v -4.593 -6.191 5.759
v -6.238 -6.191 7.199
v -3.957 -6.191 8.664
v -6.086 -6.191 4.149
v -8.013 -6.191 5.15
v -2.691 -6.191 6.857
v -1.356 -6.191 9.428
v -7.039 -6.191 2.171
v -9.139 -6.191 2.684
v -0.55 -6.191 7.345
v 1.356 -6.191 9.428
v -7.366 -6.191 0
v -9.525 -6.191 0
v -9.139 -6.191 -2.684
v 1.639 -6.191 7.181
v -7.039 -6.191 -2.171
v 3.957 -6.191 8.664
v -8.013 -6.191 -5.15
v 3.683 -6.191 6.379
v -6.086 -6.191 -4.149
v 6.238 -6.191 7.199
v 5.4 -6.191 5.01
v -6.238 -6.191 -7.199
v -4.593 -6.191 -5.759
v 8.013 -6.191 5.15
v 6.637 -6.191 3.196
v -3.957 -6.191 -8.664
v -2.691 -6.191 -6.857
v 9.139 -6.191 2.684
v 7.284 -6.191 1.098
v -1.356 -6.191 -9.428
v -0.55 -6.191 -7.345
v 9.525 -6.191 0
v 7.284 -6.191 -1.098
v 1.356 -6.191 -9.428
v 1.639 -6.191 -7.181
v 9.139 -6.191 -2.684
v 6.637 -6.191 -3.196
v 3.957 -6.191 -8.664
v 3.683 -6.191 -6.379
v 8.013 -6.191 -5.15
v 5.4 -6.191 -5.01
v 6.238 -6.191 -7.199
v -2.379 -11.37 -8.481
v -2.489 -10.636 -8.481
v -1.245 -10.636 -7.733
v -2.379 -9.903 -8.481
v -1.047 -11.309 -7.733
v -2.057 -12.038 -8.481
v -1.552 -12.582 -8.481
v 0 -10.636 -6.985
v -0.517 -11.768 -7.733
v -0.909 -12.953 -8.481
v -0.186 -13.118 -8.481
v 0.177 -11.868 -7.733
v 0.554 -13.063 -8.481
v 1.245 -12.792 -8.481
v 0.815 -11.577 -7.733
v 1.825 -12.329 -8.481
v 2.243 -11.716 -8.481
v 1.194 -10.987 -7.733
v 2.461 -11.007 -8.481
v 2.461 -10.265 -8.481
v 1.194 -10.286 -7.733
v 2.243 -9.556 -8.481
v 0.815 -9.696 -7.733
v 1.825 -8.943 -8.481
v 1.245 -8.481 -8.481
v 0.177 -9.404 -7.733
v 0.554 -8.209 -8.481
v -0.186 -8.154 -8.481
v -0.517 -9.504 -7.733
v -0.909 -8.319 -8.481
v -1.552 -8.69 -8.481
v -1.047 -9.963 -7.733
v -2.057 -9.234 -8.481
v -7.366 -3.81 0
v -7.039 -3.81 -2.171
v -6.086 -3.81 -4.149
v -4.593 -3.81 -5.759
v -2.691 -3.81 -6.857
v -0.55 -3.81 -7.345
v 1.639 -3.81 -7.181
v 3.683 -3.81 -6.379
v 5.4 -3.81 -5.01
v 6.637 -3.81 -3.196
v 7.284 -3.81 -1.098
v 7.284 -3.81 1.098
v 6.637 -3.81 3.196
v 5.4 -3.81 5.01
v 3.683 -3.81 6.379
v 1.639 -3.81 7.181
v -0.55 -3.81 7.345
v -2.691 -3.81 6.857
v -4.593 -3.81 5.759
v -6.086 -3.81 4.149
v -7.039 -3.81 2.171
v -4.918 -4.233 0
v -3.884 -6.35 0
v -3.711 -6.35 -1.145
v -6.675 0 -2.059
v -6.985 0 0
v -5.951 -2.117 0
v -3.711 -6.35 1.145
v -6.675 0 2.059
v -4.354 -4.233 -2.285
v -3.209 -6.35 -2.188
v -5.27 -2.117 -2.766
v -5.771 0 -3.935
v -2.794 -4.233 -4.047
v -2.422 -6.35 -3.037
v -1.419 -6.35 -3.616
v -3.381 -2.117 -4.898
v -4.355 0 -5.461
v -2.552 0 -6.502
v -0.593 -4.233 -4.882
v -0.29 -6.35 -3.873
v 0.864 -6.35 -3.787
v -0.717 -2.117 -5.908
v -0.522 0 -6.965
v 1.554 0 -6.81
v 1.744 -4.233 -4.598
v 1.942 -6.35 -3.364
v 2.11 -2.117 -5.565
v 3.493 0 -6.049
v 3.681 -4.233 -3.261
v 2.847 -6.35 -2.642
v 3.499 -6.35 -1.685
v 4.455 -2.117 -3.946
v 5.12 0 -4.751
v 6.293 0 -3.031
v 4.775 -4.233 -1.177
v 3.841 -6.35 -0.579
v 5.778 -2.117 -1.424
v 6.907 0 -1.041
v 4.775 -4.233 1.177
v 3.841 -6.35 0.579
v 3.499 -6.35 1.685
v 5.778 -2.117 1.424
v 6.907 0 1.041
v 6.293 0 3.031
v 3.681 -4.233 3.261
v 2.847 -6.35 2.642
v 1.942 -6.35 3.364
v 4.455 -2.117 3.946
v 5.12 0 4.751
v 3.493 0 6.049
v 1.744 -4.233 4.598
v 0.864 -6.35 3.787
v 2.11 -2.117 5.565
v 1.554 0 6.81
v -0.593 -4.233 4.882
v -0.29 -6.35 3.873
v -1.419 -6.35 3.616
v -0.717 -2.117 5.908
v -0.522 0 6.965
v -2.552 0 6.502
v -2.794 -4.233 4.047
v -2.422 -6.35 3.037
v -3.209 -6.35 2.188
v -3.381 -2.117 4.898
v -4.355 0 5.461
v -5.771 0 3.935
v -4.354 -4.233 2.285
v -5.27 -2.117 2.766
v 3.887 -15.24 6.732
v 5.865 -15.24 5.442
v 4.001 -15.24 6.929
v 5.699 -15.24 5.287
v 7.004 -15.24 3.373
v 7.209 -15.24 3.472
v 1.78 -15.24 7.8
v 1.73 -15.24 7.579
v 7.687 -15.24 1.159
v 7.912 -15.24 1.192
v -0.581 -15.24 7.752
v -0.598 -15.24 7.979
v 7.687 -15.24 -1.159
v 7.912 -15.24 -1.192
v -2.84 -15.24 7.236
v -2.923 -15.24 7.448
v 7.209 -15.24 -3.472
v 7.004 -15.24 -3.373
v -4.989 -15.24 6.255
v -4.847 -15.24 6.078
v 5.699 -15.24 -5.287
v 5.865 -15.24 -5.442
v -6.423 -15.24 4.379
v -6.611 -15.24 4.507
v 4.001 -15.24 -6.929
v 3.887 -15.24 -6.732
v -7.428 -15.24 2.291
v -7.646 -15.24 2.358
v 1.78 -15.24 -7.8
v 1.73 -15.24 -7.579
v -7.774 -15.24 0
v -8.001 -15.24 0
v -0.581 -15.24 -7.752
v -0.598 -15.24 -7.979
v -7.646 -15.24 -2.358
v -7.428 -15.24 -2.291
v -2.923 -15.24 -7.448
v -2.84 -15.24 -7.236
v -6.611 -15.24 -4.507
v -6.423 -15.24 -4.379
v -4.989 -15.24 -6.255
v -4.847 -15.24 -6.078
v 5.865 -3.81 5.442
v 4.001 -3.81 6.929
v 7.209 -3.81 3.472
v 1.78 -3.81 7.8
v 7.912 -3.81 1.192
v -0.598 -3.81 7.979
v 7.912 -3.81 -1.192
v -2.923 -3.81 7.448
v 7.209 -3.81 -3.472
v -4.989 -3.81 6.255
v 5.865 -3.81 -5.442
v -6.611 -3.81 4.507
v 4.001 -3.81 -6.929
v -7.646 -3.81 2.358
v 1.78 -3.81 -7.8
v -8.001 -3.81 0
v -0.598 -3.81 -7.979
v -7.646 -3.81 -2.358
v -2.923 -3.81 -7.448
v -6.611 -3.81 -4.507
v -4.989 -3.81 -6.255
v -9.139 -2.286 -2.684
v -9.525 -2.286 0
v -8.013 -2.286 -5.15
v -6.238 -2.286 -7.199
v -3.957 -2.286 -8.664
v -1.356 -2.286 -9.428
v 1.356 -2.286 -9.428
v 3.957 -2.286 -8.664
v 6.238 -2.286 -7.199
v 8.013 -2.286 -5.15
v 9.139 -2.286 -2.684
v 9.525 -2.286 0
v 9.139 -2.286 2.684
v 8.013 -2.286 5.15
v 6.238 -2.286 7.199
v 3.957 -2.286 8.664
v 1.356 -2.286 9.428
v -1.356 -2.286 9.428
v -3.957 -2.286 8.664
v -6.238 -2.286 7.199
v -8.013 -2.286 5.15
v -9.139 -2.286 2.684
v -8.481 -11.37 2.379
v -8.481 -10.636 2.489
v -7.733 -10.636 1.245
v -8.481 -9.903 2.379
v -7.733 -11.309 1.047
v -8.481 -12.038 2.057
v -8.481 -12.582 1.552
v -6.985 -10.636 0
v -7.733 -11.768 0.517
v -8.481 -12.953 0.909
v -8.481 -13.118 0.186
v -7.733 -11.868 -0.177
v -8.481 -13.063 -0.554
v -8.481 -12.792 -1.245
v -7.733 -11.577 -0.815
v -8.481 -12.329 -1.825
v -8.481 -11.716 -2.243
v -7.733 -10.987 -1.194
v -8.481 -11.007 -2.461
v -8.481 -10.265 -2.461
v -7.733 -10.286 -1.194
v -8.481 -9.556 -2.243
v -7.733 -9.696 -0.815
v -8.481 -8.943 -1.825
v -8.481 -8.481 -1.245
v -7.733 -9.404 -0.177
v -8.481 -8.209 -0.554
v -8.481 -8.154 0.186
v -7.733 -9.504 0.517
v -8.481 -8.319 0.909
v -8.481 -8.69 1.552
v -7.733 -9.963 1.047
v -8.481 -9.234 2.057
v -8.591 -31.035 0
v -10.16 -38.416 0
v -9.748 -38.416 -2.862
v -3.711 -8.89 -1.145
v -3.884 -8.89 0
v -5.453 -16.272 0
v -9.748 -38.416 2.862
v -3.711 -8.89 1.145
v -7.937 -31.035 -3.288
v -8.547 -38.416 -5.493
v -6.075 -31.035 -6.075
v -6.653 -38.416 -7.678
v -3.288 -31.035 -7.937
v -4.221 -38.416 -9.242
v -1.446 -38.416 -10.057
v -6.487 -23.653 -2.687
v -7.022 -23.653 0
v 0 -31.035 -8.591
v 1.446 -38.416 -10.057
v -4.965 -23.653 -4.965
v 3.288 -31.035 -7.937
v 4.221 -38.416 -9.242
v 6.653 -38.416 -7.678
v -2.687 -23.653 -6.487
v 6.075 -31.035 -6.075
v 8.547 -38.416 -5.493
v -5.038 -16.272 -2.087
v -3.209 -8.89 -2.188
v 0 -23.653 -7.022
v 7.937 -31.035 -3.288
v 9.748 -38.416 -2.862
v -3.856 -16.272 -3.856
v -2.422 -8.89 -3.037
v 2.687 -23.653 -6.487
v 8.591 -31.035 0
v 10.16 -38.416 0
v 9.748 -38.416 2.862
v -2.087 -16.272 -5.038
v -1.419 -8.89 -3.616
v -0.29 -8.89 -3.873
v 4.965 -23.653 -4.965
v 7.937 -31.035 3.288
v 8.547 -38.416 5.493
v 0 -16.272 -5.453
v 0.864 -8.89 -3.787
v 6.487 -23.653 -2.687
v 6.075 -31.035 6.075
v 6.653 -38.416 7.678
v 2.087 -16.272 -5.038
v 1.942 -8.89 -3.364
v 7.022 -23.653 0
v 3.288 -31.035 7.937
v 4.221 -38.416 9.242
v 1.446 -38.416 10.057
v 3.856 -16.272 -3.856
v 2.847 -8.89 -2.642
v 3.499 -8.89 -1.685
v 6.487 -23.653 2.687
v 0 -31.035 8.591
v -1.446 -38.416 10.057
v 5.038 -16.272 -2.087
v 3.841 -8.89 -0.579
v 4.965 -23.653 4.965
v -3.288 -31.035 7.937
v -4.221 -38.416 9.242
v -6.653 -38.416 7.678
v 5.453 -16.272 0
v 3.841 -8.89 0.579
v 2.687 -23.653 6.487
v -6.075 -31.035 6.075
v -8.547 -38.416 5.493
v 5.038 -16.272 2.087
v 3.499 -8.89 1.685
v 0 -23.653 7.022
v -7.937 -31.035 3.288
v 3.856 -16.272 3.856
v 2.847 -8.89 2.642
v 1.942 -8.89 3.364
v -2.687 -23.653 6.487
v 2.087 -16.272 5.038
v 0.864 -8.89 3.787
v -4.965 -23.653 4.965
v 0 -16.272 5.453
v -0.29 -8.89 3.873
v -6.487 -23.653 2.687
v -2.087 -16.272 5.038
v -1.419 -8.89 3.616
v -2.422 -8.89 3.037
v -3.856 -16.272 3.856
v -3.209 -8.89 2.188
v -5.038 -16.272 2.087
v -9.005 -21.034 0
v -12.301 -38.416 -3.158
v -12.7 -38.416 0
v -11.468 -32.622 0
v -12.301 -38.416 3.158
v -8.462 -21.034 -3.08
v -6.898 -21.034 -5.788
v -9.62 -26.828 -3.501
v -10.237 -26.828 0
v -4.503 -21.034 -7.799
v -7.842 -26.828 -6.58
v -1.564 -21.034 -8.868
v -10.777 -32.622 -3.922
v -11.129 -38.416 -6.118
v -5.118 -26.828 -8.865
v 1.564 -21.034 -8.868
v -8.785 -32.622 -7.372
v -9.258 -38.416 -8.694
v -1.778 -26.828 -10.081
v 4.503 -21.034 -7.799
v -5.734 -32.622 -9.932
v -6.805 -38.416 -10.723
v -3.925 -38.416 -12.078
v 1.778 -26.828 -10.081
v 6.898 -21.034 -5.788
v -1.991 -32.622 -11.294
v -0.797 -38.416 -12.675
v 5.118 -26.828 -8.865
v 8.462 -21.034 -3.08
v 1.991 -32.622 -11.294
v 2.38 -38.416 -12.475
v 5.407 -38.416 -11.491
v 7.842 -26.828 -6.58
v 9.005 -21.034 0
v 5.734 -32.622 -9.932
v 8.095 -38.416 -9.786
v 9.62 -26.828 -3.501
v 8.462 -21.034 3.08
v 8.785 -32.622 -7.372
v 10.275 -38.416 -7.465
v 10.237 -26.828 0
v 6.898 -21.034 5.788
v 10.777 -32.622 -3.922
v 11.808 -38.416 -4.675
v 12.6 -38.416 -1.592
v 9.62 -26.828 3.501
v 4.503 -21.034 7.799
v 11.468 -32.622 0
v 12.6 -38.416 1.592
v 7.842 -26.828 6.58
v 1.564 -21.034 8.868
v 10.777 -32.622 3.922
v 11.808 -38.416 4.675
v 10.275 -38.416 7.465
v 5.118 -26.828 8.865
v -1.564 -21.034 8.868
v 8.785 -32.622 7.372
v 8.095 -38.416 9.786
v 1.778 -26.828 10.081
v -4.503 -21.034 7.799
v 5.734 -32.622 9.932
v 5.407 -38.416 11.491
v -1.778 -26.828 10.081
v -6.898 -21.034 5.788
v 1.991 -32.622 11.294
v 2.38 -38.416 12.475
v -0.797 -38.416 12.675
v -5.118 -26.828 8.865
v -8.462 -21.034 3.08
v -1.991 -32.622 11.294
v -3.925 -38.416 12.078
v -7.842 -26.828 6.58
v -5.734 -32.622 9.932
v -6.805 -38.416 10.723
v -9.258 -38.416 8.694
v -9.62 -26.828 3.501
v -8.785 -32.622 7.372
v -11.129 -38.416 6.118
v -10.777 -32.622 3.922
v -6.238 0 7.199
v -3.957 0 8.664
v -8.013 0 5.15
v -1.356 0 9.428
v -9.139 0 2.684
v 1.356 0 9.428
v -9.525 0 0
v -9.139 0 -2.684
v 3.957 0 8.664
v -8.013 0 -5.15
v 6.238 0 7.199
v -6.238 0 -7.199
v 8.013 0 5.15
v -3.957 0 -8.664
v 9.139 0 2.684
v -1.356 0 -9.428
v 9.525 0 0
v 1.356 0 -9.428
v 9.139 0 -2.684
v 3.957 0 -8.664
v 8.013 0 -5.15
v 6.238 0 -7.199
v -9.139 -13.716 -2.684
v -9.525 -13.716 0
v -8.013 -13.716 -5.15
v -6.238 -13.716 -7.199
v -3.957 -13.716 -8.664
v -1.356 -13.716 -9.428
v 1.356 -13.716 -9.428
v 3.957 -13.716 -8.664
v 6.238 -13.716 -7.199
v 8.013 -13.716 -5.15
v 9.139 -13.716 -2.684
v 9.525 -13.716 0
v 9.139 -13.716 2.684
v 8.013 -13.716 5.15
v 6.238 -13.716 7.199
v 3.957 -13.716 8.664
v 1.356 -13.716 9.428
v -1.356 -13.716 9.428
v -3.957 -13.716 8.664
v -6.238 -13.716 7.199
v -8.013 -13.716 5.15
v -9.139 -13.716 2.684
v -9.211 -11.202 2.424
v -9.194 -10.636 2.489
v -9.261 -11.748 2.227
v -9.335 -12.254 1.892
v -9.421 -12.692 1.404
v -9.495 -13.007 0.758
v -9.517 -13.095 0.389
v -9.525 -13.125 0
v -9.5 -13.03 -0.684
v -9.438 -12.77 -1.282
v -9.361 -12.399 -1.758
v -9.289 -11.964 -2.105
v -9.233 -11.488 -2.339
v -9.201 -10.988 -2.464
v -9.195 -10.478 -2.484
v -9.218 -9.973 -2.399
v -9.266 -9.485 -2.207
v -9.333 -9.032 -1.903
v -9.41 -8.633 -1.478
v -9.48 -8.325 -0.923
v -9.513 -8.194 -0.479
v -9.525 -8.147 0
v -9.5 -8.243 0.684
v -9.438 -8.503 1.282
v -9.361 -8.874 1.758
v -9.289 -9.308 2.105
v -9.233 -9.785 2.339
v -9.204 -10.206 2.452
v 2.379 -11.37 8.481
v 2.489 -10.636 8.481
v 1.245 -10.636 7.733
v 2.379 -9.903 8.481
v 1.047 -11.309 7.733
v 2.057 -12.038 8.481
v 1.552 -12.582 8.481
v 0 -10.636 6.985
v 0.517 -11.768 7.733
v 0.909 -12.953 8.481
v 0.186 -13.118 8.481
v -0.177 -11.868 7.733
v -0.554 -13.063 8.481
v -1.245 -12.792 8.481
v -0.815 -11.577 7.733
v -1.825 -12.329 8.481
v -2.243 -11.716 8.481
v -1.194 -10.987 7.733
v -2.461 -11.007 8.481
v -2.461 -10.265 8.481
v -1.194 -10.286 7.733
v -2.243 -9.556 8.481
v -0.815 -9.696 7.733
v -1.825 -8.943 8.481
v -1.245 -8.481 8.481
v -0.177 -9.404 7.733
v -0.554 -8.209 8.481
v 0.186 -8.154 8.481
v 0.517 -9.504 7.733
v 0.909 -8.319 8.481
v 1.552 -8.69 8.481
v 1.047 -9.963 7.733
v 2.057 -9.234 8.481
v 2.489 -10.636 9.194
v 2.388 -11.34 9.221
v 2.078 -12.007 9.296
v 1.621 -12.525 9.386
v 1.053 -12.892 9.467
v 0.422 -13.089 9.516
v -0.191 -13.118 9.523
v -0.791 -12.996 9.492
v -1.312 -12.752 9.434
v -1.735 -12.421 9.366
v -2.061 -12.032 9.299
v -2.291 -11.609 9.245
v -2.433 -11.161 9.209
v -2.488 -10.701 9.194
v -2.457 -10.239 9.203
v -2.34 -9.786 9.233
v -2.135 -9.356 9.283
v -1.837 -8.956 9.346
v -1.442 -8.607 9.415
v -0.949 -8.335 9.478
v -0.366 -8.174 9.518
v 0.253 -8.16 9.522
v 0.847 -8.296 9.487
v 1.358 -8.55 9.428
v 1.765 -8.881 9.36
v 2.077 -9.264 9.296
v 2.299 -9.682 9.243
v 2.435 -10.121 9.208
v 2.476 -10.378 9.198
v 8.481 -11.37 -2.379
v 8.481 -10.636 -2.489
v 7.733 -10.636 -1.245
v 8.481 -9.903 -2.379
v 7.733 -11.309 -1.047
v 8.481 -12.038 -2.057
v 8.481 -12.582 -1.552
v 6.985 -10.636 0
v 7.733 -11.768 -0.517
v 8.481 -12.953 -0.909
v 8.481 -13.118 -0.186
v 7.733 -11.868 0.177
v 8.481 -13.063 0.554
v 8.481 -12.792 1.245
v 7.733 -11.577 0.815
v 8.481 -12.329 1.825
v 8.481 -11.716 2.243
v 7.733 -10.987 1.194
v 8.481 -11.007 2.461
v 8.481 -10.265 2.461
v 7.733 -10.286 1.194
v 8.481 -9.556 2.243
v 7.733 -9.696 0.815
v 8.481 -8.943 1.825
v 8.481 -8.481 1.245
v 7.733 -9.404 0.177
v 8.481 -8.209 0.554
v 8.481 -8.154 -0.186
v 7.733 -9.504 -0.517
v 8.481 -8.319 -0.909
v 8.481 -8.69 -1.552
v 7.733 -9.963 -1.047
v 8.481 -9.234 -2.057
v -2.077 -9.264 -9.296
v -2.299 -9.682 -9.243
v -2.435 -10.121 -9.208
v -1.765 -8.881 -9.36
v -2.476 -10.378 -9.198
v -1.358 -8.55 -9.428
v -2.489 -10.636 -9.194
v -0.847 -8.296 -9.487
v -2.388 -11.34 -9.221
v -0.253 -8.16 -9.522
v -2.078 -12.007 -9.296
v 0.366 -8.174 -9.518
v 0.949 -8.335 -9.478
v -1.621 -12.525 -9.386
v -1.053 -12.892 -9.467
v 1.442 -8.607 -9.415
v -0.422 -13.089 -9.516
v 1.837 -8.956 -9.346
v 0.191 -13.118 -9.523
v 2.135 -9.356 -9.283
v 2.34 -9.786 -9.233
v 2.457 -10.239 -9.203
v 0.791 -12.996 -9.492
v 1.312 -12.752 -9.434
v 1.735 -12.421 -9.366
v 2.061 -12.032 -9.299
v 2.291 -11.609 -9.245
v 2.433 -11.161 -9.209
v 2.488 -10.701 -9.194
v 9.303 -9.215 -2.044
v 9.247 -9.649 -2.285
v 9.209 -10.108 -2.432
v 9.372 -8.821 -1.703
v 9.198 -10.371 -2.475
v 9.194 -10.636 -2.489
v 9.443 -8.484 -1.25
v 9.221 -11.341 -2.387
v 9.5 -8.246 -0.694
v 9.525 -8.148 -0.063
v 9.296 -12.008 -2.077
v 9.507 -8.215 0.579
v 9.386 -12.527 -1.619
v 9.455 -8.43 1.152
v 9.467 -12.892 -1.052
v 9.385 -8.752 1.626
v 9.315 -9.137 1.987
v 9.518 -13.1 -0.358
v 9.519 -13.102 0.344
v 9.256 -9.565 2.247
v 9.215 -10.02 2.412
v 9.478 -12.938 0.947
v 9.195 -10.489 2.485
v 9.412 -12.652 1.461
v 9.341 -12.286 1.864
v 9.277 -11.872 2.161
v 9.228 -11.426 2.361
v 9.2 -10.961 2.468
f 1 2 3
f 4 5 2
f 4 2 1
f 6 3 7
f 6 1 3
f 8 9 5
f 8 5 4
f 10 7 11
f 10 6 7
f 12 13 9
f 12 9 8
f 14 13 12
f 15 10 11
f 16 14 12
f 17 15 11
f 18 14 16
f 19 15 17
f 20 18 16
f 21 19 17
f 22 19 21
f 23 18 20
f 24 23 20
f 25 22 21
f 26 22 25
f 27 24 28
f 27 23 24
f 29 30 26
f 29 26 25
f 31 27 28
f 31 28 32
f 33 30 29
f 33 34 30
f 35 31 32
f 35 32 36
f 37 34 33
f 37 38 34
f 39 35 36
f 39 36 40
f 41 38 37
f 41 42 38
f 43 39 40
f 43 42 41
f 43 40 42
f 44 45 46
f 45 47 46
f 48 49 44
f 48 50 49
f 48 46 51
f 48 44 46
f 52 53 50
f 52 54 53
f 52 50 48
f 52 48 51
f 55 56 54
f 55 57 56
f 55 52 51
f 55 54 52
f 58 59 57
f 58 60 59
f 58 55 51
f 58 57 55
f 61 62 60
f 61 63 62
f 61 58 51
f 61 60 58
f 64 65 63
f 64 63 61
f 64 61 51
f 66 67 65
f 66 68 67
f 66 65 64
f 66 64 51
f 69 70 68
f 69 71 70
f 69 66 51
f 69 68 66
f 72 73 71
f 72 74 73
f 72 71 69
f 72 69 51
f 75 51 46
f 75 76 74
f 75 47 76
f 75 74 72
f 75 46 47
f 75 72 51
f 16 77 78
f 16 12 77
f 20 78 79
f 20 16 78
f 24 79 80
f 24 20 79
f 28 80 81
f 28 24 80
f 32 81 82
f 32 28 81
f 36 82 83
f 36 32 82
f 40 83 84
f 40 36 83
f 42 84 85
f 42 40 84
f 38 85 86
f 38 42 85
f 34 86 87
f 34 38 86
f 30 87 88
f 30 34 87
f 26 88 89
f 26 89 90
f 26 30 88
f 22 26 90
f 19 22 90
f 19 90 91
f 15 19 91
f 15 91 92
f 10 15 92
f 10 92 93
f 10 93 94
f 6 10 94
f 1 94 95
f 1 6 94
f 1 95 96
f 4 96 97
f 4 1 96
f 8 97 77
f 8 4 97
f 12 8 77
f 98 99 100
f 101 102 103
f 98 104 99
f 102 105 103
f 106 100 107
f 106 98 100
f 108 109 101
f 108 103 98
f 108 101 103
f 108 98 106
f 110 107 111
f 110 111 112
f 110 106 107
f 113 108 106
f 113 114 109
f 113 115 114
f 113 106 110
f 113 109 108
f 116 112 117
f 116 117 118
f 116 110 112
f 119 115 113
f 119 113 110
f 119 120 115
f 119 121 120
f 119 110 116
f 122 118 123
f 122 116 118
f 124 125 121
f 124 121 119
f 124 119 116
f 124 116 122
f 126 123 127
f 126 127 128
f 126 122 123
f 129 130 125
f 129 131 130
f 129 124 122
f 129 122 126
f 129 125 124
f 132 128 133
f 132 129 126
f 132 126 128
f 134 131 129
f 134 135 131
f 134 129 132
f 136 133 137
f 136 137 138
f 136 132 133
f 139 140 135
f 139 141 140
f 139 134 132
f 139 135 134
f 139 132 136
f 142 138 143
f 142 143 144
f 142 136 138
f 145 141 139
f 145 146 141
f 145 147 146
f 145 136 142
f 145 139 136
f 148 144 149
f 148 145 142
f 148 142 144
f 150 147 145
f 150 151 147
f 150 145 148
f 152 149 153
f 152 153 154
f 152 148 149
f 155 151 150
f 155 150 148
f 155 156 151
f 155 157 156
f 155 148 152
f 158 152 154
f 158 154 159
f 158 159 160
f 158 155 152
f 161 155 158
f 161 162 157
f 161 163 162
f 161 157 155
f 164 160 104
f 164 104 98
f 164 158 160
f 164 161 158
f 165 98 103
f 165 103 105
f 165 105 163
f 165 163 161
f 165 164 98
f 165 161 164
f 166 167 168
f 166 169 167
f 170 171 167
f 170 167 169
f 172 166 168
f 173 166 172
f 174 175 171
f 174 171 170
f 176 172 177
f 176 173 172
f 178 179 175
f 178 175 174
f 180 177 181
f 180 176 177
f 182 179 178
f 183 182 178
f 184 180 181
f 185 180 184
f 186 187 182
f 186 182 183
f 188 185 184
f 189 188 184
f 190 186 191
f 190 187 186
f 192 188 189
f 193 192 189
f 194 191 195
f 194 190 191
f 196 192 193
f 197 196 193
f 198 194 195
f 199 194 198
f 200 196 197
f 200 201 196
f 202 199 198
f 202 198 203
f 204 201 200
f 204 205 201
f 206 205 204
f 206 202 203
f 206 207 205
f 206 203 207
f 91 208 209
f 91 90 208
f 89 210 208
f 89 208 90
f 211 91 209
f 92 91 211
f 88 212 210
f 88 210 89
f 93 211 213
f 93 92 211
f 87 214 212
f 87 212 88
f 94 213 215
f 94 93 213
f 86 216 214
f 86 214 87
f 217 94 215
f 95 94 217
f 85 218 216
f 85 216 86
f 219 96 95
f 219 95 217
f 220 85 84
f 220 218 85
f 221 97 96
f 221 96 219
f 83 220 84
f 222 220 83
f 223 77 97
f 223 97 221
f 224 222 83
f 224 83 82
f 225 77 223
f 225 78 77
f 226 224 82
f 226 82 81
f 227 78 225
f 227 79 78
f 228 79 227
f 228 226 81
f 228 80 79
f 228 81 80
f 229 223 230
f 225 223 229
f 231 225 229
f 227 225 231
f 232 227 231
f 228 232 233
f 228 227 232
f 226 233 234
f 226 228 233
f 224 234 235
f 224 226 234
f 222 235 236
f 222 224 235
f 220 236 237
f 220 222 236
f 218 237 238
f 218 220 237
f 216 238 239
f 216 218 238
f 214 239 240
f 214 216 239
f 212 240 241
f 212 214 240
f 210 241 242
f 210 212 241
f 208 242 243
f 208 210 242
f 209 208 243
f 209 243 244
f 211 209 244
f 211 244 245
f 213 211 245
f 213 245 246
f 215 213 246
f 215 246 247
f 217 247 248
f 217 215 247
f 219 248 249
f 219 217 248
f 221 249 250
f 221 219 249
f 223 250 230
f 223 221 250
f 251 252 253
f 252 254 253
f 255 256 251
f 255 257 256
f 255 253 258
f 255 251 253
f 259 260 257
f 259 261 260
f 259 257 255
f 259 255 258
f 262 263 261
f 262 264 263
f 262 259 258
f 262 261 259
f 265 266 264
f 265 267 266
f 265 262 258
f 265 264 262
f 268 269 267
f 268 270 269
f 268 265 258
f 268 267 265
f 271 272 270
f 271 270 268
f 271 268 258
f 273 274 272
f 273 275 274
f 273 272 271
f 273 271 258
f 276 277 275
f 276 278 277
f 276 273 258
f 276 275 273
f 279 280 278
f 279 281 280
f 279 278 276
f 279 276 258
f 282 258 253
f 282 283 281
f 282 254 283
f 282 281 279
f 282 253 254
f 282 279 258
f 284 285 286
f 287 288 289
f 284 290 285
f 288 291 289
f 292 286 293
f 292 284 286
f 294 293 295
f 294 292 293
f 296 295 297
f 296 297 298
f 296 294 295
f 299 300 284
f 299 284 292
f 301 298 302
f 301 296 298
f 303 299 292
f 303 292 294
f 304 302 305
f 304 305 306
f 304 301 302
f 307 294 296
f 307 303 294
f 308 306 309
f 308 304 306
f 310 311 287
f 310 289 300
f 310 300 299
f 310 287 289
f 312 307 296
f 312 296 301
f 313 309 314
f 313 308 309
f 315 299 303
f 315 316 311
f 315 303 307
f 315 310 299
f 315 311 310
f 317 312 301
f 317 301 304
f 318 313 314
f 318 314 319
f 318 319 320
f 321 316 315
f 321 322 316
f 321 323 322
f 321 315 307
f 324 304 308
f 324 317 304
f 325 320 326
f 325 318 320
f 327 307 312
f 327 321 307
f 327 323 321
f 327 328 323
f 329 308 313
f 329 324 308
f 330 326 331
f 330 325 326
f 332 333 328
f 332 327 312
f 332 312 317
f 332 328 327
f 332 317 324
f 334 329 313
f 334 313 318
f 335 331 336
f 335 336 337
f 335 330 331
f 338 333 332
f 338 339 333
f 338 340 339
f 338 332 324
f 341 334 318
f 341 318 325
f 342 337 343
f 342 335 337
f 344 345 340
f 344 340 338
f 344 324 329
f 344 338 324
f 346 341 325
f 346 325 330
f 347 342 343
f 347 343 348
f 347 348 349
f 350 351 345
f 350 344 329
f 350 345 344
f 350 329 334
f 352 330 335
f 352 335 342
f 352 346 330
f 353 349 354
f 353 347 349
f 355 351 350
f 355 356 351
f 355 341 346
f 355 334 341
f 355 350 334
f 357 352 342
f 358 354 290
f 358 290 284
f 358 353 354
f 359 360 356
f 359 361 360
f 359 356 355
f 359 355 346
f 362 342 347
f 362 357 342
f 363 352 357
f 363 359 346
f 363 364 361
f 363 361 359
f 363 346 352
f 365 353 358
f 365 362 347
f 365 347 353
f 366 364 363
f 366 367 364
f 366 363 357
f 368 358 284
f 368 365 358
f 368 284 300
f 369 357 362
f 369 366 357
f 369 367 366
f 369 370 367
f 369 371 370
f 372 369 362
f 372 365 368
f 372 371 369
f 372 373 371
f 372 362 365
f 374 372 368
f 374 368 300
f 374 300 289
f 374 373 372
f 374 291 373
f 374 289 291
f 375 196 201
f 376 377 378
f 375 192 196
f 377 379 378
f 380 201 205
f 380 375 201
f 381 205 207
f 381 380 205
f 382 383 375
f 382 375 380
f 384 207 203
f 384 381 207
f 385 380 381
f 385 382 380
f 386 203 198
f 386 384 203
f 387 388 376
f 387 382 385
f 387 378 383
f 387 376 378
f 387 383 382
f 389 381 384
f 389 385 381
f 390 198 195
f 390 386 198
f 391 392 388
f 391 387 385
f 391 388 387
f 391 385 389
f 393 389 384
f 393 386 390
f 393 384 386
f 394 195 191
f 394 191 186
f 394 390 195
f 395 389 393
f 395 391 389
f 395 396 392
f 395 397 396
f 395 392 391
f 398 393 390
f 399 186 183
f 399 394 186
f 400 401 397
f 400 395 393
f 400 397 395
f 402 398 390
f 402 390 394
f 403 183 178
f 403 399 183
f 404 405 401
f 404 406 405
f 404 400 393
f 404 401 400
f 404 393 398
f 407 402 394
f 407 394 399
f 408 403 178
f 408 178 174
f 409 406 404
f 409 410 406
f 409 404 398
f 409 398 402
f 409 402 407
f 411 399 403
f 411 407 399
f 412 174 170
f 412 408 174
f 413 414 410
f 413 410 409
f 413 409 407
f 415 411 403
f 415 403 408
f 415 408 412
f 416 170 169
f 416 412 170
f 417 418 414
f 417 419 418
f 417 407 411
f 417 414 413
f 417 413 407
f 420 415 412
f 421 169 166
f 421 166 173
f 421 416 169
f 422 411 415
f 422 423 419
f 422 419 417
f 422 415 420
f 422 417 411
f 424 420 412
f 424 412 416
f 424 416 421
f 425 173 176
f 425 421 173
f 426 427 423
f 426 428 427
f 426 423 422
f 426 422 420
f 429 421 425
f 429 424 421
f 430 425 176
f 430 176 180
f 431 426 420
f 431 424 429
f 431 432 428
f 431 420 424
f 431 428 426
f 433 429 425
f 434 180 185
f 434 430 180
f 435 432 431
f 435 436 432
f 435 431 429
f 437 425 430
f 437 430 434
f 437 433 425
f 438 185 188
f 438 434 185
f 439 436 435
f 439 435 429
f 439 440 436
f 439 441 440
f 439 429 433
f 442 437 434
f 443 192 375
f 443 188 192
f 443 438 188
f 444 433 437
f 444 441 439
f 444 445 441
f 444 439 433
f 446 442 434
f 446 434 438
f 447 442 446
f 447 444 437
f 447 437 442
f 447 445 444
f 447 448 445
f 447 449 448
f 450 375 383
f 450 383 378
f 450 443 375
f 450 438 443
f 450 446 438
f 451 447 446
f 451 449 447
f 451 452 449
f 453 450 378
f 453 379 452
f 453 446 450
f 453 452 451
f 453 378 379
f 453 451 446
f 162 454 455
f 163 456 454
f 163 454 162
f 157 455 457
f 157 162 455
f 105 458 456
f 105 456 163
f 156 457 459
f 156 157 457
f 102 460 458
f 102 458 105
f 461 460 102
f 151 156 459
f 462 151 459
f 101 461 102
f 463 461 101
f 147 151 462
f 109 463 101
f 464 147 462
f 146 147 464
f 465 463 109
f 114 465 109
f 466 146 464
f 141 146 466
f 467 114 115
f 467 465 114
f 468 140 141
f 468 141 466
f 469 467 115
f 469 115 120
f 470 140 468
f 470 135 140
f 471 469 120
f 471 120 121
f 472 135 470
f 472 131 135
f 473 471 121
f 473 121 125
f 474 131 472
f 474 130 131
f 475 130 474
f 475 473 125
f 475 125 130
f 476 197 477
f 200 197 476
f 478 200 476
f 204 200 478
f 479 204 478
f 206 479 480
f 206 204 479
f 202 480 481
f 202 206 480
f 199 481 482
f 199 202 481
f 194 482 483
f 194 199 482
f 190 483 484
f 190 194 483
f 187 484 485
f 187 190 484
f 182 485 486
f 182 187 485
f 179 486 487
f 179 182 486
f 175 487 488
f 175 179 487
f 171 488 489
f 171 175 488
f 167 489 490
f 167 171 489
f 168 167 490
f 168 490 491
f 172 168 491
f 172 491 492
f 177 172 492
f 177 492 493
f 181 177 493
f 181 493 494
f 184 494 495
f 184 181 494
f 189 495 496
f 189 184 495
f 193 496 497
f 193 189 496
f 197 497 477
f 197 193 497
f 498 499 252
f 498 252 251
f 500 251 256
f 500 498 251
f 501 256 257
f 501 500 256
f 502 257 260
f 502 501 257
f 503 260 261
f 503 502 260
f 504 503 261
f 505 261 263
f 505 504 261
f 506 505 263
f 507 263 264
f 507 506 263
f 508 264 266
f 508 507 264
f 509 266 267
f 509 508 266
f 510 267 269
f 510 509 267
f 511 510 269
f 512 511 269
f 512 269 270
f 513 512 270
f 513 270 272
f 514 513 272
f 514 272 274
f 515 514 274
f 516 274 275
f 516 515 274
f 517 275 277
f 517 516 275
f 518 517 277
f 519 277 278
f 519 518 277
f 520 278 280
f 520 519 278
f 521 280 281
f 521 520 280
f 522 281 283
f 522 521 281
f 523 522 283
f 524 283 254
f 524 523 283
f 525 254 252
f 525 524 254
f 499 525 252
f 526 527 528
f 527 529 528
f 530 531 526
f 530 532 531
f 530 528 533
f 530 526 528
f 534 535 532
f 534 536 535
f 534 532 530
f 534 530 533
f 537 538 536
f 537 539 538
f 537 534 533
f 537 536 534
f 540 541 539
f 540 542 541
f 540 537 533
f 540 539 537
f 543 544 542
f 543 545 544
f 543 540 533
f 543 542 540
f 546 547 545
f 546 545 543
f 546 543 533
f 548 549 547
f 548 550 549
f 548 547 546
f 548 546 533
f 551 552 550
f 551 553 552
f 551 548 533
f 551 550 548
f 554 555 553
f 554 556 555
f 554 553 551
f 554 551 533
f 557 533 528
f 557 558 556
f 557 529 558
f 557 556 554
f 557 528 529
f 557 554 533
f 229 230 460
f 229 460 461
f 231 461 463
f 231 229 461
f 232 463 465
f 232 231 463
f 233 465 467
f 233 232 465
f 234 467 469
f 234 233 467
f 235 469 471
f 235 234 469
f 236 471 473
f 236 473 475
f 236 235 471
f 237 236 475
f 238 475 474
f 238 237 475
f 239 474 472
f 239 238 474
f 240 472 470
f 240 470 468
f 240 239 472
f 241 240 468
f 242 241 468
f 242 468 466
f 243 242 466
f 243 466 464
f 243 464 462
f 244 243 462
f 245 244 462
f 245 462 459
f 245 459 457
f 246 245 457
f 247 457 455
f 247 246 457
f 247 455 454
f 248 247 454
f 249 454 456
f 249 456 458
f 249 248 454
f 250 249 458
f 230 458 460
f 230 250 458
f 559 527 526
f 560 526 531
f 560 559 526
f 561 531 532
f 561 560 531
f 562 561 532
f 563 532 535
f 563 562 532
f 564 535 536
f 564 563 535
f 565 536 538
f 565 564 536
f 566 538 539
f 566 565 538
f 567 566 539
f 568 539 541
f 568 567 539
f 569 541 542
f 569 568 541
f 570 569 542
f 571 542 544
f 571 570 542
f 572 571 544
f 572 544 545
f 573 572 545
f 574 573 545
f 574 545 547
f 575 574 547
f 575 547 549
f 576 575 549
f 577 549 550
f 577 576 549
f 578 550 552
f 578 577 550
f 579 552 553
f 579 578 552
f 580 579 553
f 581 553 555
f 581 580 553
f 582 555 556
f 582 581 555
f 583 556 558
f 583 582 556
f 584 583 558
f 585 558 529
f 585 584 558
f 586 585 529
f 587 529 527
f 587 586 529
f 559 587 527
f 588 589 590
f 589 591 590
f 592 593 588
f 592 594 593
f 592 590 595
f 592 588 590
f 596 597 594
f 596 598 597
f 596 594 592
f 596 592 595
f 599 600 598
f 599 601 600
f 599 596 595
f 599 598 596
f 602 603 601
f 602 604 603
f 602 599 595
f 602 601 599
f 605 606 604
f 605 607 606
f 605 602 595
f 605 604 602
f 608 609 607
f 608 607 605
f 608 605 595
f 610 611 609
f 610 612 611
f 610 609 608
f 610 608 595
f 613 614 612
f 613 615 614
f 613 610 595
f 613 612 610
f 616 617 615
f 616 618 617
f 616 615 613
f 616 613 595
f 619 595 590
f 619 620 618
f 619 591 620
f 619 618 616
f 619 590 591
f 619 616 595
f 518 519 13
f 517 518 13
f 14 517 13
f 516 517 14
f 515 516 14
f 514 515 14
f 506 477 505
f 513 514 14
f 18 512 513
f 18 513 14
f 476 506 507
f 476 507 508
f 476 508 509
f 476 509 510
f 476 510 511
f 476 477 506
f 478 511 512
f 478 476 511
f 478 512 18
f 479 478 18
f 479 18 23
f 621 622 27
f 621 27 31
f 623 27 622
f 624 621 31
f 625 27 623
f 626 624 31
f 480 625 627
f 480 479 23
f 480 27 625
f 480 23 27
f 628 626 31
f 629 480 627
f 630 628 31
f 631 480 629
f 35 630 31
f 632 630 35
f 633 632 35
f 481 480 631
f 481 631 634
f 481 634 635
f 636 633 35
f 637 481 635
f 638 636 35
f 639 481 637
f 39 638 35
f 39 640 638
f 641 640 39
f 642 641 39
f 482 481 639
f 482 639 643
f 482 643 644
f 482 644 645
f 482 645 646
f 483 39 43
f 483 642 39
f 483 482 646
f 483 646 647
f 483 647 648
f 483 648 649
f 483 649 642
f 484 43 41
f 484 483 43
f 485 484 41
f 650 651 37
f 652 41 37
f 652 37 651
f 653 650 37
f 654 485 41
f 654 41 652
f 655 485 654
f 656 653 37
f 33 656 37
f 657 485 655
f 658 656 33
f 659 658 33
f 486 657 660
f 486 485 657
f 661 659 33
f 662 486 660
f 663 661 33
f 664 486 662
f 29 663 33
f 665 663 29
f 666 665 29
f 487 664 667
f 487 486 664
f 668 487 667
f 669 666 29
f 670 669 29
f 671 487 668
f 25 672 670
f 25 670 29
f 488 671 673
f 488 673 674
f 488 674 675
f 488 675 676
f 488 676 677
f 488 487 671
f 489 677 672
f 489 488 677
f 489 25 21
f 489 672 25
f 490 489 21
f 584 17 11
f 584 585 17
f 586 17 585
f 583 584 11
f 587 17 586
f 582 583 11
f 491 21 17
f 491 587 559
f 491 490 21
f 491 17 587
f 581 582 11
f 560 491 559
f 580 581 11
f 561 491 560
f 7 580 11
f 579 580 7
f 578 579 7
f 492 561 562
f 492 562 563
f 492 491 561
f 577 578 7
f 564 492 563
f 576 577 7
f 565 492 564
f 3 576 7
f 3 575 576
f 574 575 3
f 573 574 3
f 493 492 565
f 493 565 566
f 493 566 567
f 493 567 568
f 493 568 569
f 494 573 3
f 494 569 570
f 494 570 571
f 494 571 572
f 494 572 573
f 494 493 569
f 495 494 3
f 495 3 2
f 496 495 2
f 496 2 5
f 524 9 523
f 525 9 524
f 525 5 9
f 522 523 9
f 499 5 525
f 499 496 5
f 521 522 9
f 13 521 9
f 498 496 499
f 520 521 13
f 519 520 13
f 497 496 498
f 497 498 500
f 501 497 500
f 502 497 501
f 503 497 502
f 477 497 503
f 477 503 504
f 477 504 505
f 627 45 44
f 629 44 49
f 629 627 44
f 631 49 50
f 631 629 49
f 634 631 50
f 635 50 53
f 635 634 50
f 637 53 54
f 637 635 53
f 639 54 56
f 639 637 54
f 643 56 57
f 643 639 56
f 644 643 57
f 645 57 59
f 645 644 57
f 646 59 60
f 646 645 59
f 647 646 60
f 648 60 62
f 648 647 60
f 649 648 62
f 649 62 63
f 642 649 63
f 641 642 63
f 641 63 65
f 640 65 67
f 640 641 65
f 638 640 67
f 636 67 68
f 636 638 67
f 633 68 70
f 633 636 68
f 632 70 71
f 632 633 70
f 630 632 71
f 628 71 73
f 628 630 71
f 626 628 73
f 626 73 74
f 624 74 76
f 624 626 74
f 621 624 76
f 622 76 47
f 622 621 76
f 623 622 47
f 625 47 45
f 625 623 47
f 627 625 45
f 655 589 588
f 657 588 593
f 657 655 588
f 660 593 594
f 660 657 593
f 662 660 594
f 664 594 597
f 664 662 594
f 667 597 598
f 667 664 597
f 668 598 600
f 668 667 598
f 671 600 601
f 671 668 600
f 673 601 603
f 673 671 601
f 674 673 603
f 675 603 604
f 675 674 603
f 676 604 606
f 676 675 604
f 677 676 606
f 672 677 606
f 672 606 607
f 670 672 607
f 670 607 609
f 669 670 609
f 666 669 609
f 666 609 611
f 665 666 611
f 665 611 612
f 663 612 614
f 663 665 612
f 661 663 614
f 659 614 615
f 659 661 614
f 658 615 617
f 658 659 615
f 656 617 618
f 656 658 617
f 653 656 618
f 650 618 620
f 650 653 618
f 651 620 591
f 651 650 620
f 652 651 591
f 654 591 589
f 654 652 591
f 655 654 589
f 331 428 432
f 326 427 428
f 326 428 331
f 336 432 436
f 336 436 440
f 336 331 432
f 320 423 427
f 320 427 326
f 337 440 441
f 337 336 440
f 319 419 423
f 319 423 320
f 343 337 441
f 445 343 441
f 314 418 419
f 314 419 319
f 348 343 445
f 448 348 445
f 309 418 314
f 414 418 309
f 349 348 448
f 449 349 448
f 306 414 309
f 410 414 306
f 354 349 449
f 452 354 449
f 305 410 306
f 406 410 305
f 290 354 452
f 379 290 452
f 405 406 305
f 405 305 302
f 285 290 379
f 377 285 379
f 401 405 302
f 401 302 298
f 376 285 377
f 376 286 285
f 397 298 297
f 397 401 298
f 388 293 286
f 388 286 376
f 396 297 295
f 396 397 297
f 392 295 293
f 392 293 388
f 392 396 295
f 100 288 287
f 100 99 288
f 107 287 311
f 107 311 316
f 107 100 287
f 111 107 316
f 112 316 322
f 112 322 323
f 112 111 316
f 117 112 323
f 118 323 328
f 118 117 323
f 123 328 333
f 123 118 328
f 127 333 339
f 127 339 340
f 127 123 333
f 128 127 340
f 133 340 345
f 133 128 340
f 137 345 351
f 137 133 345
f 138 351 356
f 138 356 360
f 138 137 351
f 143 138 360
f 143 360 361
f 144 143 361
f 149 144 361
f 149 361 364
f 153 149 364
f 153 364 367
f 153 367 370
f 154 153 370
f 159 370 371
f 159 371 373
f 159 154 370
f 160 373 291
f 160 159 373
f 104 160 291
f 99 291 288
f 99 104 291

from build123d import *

# Parameters (mm, degrees)
CIRPATTERN1_COUNT = 4
CHAMFER1_SIZE     = 1.524


with BuildPart() as part:
    # Sketch1 → Body (revolve)
    with BuildSketch(Plane.XY):
        Polygon((-12.7, -38.416258567), (-10.16, -38.416258567), (-3.884, -8.89), (-3.884, -6.35), (-6.985, 0), (-9.525, 0), (-9.525, -3.81), (-7.366, -3.81), (-7.366, -6.19125), (-9.525, -6.19125), (-9.525, -15.24), (-7.773734167, -15.24), align=None)
    revolve(axis=Axis((0, 0, 0), (0, -1, 0)))

    # Sketch4 → SetScrew (revolve, cut)
    with BuildSketch(Plane(origin=(-9.525, -10.63625, 0), x_dir=(0, 0, 1), z_dir=(0, 1, 0))):
        Polygon((0, 0), (0, 2.54), (2.4892, 1.044337747), (2.4892, 0), align=None)
    setscrew = revolve(axis=Axis((-15.875, -10.63625, 0), (1, 0, 0)), mode=Mode.SUBTRACT)

    # CirPattern1: SetScrew ×4 about axis
    cirpattern1_axis = Axis((0, 0, 0), (0, 1, 0))
    for i in range(1, CIRPATTERN1_COUNT):
        add(setscrew.rotate(cirpattern1_axis, i * 360 / CIRPATTERN1_COUNT), mode=Mode.SUBTRACT)

    # Chamfer1
    chamfer1_edges = [part.edges().sort_by_distance(p)[0] for p in [
        (9.525, -3.81, 0),
        (9.525, -15.24, 0),
    ]]
    chamfer(chamfer1_edges, length=CHAMFER1_SIZE)


solid = part.part
